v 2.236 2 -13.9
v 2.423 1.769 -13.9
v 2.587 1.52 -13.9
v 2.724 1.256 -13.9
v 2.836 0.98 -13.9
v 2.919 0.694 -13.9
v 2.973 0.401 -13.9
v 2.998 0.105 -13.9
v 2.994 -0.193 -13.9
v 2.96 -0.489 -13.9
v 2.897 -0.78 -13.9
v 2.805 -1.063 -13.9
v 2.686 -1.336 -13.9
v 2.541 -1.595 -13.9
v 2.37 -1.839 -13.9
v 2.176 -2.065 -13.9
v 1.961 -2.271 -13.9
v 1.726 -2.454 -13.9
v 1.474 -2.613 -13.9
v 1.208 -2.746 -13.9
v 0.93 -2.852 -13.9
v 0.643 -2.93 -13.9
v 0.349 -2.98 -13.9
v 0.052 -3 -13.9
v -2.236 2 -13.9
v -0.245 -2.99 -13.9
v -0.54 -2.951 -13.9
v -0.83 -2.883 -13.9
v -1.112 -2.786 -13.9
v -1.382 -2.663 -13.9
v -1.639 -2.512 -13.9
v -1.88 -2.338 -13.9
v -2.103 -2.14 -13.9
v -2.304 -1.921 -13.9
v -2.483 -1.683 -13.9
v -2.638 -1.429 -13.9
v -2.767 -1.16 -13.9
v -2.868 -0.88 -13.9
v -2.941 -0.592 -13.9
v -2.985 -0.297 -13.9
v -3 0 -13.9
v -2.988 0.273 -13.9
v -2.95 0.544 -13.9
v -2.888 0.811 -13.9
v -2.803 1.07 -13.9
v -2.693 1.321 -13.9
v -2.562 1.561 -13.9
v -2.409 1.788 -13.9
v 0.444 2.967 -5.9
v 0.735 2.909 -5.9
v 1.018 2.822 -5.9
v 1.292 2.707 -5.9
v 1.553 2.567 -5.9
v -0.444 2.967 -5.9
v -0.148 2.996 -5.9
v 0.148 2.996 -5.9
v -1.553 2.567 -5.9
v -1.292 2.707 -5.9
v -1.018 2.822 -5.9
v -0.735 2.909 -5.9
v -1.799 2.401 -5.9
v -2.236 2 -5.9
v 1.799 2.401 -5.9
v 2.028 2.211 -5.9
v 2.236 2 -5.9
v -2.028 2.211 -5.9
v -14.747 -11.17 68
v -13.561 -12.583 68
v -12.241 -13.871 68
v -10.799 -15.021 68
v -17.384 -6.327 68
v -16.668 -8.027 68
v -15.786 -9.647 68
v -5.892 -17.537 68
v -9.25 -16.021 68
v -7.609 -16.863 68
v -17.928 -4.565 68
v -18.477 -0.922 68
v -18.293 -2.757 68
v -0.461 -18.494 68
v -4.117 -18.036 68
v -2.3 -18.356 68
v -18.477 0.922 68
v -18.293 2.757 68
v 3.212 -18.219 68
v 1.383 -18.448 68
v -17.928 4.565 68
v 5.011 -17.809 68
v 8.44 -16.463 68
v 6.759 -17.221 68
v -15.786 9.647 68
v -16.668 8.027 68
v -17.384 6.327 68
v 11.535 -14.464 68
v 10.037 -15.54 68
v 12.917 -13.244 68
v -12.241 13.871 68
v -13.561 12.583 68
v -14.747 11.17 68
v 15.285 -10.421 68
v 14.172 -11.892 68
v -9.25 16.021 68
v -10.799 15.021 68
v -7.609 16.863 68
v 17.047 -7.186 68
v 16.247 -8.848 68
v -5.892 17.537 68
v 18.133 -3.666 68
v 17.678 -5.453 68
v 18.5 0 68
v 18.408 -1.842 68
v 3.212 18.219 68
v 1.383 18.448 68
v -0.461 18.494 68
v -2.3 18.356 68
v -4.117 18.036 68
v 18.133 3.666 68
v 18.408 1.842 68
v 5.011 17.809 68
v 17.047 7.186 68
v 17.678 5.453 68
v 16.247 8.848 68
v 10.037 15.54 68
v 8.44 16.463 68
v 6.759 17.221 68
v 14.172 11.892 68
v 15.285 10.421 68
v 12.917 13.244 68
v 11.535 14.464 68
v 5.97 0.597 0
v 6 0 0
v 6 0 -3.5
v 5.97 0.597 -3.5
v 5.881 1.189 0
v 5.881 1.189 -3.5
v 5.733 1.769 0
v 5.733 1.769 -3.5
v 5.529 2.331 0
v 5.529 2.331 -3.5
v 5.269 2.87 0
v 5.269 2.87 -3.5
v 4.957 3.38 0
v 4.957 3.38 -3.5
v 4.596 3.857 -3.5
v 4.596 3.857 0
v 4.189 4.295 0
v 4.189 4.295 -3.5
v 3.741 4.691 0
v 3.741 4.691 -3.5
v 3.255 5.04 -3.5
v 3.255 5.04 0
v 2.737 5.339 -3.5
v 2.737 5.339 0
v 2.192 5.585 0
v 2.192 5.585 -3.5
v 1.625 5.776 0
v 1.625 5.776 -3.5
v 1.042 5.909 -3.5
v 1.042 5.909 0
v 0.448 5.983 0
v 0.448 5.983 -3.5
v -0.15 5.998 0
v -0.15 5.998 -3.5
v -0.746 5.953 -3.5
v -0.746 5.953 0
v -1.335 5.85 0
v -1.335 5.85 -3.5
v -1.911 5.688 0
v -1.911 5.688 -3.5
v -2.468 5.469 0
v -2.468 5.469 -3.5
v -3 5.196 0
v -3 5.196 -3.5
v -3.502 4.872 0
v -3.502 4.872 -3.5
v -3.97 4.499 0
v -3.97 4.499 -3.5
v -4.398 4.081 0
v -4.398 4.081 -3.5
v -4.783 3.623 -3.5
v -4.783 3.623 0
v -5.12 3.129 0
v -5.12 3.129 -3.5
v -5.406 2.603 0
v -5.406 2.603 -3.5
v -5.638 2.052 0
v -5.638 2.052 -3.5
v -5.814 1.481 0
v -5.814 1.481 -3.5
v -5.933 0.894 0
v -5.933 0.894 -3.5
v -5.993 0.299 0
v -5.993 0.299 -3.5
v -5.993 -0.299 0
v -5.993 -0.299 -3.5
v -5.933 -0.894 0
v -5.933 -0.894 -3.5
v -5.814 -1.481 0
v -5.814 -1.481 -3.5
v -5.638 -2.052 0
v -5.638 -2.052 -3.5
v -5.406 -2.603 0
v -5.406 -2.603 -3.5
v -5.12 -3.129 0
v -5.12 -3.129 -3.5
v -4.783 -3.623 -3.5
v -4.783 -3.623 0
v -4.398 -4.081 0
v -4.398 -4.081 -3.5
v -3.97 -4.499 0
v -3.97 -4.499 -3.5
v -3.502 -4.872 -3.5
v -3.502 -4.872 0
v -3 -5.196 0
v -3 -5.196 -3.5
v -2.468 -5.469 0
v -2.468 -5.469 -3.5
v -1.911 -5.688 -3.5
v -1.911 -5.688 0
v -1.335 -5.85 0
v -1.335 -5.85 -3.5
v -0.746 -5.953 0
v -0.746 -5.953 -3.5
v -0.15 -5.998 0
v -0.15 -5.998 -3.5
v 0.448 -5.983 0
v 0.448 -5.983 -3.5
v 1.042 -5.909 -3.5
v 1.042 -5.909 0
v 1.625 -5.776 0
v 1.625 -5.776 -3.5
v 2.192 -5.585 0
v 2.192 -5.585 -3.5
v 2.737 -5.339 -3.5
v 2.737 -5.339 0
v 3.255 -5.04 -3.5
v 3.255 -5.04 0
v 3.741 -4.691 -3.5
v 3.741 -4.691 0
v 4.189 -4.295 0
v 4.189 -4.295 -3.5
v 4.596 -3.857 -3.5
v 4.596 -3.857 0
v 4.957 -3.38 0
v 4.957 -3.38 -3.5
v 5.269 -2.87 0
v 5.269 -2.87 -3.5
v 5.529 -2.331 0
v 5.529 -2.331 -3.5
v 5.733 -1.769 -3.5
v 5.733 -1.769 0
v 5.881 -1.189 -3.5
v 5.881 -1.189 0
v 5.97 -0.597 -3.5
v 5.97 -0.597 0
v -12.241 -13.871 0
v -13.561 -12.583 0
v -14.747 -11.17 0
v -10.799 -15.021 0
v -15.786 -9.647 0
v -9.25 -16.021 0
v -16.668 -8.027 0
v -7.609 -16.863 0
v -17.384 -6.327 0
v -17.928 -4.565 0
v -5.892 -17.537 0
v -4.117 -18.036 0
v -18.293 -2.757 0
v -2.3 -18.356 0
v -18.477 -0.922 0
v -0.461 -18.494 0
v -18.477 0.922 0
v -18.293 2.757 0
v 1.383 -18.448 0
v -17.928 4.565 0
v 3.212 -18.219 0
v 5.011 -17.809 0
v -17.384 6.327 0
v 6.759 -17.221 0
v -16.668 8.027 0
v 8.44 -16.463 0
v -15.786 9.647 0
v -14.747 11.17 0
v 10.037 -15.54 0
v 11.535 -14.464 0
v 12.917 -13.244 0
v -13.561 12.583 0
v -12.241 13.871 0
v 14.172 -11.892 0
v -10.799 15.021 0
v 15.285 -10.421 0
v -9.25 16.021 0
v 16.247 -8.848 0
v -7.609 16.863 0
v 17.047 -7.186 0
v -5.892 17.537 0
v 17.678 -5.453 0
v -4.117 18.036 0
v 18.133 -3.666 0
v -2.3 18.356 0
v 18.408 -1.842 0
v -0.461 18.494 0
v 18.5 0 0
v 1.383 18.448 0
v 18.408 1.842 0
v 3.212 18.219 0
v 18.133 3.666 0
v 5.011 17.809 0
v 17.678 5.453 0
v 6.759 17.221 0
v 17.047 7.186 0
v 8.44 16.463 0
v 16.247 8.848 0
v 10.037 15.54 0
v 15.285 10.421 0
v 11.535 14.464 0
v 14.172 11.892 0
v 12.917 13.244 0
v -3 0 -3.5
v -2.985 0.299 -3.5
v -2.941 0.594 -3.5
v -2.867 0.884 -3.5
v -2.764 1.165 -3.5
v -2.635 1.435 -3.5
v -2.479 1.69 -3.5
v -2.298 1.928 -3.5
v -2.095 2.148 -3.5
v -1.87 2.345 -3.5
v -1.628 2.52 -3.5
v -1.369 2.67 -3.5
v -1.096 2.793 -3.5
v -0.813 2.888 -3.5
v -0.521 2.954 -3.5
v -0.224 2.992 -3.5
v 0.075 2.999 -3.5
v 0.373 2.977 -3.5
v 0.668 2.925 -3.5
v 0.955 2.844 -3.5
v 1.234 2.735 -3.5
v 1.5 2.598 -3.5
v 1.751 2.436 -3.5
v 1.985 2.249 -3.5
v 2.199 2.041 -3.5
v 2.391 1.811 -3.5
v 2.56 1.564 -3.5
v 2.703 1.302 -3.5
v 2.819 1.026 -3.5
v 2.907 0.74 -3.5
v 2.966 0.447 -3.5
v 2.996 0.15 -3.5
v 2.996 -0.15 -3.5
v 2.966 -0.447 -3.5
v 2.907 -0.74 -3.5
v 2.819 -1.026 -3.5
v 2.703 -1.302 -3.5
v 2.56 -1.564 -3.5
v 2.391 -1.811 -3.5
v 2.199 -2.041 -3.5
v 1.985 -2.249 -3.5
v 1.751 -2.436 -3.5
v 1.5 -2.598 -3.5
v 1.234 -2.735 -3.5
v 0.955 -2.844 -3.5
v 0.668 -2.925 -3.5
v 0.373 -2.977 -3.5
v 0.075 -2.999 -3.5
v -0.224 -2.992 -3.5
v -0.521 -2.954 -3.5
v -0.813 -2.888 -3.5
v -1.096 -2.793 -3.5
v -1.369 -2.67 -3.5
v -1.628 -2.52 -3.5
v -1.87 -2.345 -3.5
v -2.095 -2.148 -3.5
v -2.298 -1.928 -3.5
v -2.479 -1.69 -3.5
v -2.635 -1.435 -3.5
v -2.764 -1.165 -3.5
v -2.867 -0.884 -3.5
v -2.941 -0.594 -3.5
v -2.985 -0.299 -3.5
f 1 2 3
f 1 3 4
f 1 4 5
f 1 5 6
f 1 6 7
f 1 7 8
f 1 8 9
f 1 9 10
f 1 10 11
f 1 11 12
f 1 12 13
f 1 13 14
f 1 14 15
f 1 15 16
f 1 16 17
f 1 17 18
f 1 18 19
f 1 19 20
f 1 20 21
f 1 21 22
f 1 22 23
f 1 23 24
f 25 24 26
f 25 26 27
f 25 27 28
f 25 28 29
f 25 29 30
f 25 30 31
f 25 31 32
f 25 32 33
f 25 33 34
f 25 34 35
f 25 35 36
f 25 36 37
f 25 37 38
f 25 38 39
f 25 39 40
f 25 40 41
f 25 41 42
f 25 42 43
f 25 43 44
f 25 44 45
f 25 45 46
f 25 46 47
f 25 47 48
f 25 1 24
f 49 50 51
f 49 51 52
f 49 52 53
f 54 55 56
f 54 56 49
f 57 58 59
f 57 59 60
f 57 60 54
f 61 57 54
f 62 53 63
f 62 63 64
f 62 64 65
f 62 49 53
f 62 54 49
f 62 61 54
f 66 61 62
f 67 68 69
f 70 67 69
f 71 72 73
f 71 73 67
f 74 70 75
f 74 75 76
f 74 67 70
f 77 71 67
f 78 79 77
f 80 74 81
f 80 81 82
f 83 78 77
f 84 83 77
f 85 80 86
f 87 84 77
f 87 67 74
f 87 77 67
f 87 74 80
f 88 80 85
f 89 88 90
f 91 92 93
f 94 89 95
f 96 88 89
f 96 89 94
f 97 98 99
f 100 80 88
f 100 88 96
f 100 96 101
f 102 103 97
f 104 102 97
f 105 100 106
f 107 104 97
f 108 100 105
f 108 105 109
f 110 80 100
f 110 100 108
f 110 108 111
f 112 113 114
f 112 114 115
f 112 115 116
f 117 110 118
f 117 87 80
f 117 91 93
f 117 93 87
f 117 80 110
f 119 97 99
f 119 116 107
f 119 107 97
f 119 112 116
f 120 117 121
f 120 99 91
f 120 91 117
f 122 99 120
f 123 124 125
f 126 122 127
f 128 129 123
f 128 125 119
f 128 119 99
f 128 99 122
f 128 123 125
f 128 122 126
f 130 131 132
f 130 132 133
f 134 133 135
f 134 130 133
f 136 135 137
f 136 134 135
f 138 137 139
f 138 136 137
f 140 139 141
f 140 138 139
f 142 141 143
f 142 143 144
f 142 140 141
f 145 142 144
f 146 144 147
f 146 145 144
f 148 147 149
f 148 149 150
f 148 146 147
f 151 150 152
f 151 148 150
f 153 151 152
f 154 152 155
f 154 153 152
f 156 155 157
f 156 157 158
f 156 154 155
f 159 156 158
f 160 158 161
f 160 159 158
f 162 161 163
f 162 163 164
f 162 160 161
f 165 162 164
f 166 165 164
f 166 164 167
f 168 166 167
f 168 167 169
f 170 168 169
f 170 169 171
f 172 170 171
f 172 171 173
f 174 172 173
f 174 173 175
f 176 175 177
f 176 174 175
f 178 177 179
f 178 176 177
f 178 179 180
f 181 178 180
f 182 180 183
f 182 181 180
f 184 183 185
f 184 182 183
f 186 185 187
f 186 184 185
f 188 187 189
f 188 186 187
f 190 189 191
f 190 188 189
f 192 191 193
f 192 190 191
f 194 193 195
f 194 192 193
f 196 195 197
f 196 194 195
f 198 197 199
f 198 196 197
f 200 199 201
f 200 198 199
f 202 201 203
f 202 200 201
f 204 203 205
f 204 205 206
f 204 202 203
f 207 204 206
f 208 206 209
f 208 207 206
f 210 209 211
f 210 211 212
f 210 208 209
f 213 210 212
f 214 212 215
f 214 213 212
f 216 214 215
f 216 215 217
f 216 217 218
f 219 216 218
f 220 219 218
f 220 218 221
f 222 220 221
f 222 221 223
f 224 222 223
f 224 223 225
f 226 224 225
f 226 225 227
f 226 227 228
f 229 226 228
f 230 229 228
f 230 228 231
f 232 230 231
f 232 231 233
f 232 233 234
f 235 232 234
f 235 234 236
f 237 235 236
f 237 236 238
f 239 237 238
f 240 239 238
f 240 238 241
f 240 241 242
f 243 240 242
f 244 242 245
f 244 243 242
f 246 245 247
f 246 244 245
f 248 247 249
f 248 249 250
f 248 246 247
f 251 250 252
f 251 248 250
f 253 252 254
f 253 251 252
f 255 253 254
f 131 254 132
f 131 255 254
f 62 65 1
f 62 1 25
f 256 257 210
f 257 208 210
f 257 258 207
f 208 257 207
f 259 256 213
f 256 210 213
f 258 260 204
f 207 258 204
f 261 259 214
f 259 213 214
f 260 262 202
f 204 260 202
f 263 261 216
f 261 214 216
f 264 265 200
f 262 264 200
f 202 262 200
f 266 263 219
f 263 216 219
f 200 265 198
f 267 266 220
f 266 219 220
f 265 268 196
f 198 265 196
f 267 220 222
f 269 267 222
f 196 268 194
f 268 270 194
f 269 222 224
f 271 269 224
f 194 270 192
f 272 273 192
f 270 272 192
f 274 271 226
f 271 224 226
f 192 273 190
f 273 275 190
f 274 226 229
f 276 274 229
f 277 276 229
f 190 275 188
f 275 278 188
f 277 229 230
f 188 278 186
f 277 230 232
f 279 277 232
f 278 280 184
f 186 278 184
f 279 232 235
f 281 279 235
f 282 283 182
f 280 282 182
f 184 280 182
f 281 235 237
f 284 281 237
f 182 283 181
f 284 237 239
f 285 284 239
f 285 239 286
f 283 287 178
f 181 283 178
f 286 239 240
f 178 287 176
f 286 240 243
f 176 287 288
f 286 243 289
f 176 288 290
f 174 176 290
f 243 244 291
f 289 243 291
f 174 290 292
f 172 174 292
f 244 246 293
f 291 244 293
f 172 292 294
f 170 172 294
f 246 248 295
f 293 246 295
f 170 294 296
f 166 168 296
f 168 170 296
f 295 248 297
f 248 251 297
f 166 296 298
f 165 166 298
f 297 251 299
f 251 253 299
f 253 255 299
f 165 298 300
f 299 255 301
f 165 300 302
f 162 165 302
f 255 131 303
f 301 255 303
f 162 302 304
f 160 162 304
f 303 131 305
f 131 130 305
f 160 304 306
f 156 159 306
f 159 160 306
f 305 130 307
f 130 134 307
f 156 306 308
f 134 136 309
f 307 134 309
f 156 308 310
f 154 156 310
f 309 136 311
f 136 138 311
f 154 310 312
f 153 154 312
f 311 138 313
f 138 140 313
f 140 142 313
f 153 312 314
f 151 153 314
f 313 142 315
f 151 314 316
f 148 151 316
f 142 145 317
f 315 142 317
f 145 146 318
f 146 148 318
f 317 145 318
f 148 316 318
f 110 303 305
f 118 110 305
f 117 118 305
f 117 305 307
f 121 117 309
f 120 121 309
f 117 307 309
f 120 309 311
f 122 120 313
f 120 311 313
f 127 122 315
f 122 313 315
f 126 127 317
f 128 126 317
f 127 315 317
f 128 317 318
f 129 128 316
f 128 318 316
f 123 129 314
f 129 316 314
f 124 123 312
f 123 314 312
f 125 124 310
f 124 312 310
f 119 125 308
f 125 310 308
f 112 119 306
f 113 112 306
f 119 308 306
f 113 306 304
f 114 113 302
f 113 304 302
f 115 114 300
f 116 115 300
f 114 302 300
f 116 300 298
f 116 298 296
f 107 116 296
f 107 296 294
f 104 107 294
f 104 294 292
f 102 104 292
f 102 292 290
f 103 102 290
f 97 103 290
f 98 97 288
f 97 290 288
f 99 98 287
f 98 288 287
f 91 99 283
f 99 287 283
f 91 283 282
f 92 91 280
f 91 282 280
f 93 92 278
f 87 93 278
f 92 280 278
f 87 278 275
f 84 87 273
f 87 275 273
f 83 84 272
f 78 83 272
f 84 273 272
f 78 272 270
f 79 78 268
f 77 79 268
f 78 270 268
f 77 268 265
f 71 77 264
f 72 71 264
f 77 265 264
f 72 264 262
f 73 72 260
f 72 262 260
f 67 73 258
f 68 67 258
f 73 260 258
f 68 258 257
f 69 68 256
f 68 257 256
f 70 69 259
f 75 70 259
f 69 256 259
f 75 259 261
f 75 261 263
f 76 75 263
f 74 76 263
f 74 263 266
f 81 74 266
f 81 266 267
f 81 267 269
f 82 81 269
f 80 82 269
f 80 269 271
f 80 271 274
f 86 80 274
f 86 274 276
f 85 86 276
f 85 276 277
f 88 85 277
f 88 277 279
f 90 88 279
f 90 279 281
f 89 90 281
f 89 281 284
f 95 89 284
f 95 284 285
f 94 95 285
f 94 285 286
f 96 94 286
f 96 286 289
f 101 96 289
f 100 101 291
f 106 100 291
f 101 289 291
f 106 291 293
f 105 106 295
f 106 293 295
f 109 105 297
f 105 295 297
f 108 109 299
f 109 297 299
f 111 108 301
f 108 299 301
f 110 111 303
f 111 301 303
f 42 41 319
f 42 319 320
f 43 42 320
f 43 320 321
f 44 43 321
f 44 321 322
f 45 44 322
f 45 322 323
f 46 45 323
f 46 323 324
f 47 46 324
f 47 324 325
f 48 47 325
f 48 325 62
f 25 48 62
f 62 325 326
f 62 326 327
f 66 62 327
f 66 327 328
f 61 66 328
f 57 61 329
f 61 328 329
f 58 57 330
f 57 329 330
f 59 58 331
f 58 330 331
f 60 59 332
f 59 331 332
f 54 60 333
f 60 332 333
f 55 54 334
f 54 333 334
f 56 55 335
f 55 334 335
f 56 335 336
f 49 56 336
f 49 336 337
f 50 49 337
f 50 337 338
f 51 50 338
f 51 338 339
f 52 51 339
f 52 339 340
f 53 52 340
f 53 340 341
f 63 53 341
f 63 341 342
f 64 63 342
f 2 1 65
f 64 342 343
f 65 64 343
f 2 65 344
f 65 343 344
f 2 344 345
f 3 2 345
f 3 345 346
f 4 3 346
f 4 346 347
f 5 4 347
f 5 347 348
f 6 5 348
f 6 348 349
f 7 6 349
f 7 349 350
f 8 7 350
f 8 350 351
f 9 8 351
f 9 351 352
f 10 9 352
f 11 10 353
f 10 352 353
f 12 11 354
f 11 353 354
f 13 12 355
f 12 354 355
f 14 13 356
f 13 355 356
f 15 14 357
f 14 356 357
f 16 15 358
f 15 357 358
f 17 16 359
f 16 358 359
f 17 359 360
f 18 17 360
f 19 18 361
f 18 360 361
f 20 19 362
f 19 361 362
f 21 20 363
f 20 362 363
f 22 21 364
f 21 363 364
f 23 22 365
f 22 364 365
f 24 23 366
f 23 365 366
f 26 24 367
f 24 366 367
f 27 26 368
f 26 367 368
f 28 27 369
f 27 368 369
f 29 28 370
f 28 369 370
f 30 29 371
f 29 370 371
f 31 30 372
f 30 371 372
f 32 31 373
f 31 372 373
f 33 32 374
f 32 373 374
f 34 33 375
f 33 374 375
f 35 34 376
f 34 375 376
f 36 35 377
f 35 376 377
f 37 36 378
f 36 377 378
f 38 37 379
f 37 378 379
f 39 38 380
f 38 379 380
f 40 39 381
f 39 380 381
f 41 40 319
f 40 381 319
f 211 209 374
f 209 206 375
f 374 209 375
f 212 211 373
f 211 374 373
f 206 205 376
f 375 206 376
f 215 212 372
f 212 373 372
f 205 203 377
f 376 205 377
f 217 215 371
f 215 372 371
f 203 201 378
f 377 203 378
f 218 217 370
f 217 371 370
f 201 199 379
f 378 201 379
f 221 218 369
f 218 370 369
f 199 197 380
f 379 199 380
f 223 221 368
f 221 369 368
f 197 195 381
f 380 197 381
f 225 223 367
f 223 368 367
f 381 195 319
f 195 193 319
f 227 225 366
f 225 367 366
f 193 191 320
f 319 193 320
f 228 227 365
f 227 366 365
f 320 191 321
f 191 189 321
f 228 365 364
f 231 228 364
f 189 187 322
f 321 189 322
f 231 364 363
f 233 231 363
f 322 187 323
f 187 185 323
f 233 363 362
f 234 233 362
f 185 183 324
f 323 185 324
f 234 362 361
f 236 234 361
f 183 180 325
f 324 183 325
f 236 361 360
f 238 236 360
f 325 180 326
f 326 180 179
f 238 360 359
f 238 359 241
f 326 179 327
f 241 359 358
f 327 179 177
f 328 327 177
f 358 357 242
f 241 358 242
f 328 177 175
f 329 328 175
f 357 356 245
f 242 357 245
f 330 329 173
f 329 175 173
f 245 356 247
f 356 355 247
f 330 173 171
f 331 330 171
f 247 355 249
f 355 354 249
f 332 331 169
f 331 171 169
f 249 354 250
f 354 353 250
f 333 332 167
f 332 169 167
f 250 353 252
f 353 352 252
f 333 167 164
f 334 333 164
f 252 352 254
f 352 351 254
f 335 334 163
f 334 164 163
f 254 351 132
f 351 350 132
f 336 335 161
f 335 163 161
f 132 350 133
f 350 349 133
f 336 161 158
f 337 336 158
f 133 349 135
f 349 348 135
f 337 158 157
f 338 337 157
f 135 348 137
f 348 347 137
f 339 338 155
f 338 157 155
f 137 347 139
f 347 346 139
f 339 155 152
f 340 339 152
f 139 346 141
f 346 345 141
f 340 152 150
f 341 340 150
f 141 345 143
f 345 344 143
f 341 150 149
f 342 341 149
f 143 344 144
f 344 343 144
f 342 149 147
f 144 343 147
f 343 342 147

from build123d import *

# Parameters (mm, degrees)
SKETCH1_R           = 18.5
BOSS_EXTRUDE1_DEPTH = 68
SKETCH3_R           = 6
BOSS_EXTRUDE2_DEPTH = 3.5
SKETCH4_R           = 3
BOSS_EXTRUDE3_DEPTH = 10.4
CUT_EXTRUDE1_START  = -8
CUT_EXTRUDE1_DEPTH  = 8


with BuildPart() as part:
    # Sketch1 → Boss-Extrude1 (new body)
    with BuildSketch(Plane.XY):
        Circle(SKETCH1_R)
    extrude(amount=BOSS_EXTRUDE1_DEPTH)

    # Sketch3 → Boss-Extrude2 (add)
    with BuildSketch(Plane.XY):
        Circle(SKETCH3_R)
    extrude(amount=-BOSS_EXTRUDE2_DEPTH)

    # Sketch4 → Boss-Extrude3 (add)
    with BuildSketch(Plane(origin=(0, 0, -3.5), x_dir=(-1, 0, 0), z_dir=(0, 0, -1))):
        Circle(SKETCH4_R)
    extrude(amount=BOSS_EXTRUDE3_DEPTH)

    # Sketch5 → Cut-Extrude1 (cut)
    with BuildSketch(Plane(origin=(0, 0, -13.9), x_dir=(-1, 0, 0), z_dir=(0, 0, -1)).offset(CUT_EXTRUDE1_START)):
        with BuildLine():
            Line((-2.236067977, 2), (2.236067977, 2))
            ThreePointArc((2.236067977, 2), (0, 3), (-2.236067977, 2))
        make_face()
    extrude(amount=CUT_EXTRUDE1_DEPTH, mode=Mode.SUBTRACT)


solid = part.part
